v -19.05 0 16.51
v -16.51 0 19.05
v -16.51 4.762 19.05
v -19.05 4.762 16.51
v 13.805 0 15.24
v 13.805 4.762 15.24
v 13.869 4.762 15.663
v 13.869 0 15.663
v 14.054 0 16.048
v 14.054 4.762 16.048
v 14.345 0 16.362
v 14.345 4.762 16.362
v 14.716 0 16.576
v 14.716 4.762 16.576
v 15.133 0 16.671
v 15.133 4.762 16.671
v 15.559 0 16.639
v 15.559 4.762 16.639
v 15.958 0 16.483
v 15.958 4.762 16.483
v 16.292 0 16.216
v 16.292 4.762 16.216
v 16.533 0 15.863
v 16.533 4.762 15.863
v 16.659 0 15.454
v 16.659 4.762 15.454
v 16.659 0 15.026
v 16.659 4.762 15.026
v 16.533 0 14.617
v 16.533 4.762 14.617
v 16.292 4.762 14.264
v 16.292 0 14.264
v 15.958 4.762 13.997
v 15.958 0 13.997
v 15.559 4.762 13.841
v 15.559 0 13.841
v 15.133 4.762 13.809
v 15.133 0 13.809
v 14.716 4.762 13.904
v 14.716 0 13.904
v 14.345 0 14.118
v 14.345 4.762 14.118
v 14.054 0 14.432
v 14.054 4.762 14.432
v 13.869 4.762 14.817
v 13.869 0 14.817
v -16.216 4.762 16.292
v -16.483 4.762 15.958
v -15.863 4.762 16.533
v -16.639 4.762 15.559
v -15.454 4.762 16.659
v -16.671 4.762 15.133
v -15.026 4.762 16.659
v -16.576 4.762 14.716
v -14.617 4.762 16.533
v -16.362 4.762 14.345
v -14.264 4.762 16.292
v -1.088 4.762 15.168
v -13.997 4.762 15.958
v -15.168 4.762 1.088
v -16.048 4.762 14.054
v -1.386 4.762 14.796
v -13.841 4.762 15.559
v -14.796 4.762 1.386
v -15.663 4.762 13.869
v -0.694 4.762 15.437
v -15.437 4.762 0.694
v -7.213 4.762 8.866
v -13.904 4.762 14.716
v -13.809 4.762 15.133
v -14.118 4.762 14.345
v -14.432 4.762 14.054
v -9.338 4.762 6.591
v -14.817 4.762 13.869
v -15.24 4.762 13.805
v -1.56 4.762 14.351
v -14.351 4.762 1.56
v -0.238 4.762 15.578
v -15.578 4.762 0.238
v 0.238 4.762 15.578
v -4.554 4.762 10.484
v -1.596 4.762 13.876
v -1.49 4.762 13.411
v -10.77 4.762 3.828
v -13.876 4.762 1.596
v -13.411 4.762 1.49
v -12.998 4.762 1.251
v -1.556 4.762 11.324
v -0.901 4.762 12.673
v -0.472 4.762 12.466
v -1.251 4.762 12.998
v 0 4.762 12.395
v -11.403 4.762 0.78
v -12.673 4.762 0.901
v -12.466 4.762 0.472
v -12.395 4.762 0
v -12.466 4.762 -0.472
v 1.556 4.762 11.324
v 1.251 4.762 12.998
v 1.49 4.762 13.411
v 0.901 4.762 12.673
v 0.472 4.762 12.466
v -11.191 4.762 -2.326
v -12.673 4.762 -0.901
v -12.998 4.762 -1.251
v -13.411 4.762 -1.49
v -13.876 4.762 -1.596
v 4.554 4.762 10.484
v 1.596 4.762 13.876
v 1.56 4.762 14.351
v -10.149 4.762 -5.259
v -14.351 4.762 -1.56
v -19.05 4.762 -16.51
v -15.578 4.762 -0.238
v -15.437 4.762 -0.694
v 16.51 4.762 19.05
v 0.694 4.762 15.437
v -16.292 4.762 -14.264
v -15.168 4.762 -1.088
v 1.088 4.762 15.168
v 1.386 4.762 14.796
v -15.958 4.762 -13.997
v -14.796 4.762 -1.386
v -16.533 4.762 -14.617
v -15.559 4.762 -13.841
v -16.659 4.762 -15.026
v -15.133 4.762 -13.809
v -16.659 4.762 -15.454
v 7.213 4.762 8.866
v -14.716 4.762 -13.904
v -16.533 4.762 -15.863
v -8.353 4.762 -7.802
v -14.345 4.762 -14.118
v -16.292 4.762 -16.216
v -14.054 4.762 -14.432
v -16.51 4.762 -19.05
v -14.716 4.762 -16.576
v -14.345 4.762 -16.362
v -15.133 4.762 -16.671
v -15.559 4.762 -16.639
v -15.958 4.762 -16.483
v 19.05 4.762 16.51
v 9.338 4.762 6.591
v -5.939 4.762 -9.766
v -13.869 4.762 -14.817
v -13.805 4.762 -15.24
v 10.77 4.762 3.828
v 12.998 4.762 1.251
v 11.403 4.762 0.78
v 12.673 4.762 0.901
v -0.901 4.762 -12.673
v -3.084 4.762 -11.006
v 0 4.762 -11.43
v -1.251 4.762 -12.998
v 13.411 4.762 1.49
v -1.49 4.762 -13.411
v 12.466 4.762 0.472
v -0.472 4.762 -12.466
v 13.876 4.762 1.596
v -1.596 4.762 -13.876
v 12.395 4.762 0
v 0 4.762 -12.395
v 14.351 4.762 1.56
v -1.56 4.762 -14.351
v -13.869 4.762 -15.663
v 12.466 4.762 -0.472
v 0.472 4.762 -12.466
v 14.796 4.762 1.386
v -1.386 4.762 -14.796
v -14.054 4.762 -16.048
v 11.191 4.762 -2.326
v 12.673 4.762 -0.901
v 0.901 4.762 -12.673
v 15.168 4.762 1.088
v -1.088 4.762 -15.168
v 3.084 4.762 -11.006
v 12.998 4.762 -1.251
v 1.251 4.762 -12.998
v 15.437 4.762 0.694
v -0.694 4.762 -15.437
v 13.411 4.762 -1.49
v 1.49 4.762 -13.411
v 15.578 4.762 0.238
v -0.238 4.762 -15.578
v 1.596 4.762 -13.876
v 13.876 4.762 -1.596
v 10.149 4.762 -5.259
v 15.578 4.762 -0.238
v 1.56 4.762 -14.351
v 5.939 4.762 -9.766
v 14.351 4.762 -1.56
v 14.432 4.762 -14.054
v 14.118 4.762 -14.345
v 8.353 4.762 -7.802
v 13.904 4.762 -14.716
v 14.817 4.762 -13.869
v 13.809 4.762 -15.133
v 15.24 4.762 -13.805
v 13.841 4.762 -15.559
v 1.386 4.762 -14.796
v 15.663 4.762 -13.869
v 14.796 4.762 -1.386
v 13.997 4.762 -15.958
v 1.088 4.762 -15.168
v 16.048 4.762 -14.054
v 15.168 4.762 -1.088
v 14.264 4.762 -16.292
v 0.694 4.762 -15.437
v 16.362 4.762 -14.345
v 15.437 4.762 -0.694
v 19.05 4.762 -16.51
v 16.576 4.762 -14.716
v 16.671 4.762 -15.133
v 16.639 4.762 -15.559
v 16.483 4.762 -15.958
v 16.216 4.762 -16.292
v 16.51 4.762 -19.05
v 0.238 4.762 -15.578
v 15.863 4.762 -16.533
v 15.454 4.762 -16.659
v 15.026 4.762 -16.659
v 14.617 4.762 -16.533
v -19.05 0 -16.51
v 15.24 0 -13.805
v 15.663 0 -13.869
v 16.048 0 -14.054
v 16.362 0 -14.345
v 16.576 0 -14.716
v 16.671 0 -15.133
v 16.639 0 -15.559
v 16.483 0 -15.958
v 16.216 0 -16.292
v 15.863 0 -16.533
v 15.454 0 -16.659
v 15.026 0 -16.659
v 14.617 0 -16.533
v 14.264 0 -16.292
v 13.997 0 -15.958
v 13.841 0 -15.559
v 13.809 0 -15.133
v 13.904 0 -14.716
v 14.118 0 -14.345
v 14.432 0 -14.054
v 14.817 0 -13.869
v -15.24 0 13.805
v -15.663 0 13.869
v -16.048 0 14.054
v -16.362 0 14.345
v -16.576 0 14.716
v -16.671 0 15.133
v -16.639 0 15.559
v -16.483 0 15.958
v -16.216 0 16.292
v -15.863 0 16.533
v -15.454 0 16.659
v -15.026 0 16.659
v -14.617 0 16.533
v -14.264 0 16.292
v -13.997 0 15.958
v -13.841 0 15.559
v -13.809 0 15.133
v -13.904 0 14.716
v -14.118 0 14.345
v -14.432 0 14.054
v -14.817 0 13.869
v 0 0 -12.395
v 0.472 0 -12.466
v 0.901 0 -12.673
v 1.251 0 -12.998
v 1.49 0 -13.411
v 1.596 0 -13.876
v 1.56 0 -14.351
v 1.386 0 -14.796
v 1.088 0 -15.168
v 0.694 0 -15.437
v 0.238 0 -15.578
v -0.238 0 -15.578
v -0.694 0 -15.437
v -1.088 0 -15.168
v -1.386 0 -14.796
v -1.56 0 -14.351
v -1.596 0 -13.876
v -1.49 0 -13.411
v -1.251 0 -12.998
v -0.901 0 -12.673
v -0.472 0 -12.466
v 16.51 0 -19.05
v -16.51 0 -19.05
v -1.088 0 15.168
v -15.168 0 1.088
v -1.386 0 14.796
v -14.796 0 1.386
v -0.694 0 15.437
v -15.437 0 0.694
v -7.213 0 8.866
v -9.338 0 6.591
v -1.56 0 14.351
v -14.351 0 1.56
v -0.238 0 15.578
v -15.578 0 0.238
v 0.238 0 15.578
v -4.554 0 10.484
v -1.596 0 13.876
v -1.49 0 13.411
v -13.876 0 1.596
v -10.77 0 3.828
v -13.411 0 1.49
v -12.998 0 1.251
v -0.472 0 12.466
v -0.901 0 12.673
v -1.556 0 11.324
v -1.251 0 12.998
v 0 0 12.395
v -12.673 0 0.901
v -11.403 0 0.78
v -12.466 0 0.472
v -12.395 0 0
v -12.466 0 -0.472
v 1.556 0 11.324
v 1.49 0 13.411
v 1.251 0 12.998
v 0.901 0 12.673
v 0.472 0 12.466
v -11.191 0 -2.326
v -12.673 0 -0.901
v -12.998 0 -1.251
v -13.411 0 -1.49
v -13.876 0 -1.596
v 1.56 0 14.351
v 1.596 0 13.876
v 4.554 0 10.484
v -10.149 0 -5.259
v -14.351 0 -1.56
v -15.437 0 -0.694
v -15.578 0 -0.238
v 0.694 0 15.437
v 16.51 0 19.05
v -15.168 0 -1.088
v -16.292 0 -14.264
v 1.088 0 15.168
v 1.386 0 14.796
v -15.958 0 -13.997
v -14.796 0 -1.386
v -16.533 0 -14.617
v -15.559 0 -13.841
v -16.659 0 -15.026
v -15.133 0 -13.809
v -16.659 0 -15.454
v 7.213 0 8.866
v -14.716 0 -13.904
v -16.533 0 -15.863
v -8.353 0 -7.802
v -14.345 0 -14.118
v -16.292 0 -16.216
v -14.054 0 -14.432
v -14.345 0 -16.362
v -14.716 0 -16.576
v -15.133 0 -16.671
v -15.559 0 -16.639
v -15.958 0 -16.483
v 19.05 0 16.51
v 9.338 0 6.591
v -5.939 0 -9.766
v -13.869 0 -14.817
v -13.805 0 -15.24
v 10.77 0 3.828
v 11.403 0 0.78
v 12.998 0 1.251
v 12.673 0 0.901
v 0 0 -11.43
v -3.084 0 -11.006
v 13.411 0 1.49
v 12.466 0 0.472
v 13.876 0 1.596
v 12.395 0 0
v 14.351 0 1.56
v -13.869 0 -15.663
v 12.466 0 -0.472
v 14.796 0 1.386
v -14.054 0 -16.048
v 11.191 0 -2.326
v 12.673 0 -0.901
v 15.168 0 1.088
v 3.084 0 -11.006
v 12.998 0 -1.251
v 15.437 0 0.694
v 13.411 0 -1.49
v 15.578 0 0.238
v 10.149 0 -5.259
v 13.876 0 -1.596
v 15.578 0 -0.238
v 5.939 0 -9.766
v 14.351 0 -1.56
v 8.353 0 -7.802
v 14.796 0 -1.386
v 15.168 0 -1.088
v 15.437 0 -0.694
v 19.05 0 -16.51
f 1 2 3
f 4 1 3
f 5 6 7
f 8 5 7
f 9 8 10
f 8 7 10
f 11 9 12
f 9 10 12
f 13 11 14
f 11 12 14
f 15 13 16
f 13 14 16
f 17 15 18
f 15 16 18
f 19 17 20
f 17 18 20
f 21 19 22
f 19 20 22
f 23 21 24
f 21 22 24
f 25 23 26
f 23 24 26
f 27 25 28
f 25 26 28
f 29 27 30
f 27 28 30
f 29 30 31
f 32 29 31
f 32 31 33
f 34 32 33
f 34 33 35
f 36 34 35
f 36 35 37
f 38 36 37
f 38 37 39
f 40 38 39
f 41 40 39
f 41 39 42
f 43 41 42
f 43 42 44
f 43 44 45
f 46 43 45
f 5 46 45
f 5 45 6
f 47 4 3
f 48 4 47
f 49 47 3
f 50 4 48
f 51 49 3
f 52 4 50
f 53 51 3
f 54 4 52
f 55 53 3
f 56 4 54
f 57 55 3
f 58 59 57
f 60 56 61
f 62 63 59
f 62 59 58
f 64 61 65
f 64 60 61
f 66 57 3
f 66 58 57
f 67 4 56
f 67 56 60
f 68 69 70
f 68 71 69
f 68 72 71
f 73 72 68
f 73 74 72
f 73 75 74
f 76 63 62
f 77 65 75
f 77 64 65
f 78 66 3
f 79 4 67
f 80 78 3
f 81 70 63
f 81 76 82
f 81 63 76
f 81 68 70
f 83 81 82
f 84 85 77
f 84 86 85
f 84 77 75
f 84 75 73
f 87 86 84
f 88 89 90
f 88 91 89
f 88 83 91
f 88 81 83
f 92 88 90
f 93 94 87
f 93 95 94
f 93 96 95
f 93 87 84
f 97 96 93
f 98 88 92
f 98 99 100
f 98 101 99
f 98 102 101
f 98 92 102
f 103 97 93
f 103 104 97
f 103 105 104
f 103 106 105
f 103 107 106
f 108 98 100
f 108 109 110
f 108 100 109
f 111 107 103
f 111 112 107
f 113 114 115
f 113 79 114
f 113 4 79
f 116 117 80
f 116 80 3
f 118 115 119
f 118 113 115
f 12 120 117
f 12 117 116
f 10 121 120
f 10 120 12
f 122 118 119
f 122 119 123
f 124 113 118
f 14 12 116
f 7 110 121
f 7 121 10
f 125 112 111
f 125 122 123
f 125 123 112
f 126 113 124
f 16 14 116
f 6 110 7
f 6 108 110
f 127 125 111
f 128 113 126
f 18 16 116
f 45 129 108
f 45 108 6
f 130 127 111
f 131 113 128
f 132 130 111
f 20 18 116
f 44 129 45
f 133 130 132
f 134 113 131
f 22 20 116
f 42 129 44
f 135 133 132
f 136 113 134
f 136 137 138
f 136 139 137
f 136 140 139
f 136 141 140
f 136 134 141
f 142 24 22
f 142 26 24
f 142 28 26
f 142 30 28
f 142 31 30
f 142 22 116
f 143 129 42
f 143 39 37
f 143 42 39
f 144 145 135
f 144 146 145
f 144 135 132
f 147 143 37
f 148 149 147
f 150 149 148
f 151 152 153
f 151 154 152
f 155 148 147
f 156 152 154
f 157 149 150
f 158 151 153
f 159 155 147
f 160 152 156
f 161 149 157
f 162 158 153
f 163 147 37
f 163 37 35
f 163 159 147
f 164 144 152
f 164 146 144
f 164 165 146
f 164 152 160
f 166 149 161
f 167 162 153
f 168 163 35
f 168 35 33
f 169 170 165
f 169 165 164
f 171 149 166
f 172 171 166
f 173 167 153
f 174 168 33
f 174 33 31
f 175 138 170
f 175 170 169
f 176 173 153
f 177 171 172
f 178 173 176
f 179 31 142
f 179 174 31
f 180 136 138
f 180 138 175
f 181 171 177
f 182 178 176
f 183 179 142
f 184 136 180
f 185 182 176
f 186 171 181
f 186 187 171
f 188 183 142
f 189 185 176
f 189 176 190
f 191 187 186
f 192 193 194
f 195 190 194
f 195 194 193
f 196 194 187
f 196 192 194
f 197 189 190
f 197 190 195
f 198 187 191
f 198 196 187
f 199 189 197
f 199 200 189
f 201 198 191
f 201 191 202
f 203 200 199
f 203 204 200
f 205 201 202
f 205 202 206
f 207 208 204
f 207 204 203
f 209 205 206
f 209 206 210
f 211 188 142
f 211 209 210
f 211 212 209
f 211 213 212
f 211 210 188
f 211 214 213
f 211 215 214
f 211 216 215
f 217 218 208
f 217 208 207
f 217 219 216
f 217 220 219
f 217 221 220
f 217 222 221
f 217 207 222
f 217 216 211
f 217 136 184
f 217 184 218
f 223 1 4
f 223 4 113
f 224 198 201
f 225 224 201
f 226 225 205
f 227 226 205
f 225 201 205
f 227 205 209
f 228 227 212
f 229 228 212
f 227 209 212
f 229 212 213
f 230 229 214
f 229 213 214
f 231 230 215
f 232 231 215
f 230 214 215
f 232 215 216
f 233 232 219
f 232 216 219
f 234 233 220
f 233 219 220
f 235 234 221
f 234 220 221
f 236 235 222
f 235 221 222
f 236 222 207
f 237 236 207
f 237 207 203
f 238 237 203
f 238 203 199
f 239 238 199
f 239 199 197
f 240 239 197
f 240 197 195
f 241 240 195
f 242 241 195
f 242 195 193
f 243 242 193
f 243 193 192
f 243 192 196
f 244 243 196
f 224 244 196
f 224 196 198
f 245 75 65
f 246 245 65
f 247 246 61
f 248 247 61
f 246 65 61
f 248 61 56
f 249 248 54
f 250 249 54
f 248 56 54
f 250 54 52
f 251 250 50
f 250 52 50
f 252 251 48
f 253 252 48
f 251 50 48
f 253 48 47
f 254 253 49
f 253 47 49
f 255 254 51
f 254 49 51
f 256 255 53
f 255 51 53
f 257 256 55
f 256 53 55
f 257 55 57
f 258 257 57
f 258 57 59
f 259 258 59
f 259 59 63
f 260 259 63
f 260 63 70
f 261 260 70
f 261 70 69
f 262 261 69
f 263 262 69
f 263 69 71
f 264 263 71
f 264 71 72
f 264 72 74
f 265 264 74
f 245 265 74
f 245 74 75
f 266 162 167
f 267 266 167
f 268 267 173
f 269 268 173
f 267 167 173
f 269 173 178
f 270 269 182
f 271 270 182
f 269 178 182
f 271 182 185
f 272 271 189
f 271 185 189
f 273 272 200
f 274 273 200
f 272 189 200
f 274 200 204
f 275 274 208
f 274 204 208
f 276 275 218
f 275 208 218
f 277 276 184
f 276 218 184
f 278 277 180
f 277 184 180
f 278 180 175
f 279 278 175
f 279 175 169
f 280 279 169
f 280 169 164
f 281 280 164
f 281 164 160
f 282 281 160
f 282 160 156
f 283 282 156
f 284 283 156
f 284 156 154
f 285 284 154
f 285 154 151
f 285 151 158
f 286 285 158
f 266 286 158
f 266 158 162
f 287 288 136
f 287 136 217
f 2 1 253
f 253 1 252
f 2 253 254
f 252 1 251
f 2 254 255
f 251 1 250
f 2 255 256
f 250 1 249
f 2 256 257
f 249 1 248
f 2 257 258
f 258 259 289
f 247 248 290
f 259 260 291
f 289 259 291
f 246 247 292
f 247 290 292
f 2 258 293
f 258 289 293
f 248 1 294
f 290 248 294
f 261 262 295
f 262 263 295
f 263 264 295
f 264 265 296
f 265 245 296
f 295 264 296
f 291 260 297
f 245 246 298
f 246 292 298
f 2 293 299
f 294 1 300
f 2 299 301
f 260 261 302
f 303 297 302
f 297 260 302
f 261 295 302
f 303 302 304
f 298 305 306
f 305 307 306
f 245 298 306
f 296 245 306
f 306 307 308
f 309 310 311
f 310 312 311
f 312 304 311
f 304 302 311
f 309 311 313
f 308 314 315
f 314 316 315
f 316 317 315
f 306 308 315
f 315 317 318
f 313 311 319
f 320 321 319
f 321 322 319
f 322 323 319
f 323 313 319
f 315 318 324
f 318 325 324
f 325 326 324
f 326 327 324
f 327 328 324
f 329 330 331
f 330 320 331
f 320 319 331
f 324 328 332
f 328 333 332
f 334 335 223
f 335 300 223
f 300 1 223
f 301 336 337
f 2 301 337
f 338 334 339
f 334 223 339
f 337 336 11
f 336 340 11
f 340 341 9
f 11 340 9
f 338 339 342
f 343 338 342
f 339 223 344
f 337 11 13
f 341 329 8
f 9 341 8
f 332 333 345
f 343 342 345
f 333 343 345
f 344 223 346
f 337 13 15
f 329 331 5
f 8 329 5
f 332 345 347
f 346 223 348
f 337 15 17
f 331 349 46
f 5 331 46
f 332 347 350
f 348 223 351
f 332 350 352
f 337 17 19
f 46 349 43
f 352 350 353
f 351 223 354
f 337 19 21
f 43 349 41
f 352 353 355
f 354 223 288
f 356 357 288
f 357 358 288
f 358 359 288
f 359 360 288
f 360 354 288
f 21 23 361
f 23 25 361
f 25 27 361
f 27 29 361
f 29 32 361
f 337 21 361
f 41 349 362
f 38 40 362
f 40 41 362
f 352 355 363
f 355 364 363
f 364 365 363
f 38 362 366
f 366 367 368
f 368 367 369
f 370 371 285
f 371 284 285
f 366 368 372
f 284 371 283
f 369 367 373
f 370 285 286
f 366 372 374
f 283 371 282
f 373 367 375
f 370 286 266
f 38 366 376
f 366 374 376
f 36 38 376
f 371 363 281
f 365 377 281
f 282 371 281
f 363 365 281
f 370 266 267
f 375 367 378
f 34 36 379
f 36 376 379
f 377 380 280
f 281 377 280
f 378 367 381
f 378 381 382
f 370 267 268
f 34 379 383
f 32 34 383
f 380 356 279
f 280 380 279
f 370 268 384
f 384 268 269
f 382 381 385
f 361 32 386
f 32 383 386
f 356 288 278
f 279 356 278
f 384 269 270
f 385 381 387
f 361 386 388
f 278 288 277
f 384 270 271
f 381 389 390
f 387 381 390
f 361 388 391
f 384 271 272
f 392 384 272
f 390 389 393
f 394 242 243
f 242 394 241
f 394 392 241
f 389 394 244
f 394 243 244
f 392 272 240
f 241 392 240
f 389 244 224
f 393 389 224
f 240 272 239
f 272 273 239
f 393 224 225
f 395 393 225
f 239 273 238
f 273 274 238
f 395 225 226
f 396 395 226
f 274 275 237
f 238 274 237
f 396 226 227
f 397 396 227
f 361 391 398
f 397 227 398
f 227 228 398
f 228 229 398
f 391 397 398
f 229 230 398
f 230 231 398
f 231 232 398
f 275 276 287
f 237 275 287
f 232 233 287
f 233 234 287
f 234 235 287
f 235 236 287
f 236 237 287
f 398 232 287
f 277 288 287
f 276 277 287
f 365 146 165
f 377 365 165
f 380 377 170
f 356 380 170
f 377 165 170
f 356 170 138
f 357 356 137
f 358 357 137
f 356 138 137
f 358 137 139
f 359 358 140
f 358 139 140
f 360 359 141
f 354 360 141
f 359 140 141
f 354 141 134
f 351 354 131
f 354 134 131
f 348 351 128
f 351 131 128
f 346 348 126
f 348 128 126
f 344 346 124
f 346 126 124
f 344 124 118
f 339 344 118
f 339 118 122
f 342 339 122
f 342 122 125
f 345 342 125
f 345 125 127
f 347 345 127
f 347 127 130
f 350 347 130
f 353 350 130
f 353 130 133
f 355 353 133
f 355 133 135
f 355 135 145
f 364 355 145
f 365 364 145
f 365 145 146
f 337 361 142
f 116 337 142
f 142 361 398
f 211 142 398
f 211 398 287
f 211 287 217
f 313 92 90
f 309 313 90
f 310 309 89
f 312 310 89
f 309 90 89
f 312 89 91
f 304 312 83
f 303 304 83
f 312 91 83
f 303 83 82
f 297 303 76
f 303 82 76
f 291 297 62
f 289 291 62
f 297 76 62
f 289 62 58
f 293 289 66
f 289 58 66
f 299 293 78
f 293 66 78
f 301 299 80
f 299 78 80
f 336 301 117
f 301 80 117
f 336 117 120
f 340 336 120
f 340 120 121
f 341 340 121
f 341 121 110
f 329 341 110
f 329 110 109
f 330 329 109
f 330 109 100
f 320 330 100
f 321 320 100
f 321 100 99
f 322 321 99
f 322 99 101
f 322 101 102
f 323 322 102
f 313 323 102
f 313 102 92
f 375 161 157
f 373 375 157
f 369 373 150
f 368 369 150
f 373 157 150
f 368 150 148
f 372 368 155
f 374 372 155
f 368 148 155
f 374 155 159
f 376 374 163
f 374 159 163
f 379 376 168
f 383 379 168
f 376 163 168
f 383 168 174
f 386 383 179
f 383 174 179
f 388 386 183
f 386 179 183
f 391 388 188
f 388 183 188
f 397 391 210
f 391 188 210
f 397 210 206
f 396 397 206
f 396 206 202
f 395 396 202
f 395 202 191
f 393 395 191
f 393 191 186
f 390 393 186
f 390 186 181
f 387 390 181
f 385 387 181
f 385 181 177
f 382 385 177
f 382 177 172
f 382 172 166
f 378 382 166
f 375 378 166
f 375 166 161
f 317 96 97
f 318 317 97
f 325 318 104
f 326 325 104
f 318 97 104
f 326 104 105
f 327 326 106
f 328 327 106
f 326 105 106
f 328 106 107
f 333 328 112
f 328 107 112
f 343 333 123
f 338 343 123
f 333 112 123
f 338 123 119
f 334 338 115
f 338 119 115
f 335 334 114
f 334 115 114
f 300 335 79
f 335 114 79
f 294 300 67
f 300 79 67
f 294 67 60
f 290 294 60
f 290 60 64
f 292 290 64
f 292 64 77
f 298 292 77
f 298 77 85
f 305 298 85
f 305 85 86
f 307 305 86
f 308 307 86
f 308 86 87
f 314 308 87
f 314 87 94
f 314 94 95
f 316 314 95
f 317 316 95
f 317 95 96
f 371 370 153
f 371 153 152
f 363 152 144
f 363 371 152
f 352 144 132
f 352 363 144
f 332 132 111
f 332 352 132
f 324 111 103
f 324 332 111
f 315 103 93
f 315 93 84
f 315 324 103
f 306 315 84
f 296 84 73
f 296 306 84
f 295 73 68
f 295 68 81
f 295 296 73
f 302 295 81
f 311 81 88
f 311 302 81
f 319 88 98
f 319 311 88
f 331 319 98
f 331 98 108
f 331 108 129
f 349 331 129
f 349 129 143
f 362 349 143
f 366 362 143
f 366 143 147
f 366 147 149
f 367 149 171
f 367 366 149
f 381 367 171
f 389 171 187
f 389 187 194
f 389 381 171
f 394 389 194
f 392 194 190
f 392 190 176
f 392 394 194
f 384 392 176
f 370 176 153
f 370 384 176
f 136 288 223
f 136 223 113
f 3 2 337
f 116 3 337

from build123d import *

# Parameters (mm, degrees)
SKETCH1_W           = 38.1
SKETCH1_H           = 38.1
SKETCH1_R           = 11.43
BOSS_EXTRUDE1_DEPTH = 4.7625
SKETCH2_R           = 1.6002
SKETCH2_R_2         = 1.4351
CUT_EXTRUDE1_DEPTH  = 28.358479604
CIRPATTERN1_COUNT   = 4
CHAMFER1_SIZE       = 2.54


with BuildPart() as part:
    # Sketch1 → Boss-Extrude1 (new body)
    with BuildSketch(Plane(origin=(0, 0, 0), x_dir=(1, 0, 0), z_dir=(0, 1, 0))):
        Rectangle(SKETCH1_W, SKETCH1_H)
        with Locations(Location((0, 0, 0), (0, 0, 90))):
            Circle(SKETCH1_R, mode=Mode.SUBTRACT)
    extrude(amount=BOSS_EXTRUDE1_DEPTH)

    # Sketch2 → Cut-Extrude1 (cut, through all)
    with BuildSketch(Plane(origin=(0, 4.7625, 0), x_dir=(1, 0, 0), z_dir=(0, 1, 0))):
        with Locations(Location((0, 13.9954, 0), (0, 0, 270))):
            Circle(SKETCH2_R)
        with Locations(Location((15.24, 15.24, 0), (0, 0, 270))):
            Circle(SKETCH2_R_2)
    cut_extrude1 = extrude(amount=-CUT_EXTRUDE1_DEPTH, mode=Mode.SUBTRACT)

    # CirPattern1: Cut-Extrude1 ×4 about axis
    cirpattern1_axis = Axis((0, 0, 0), (0, 1, 0))
    for i in range(1, CIRPATTERN1_COUNT):
        add(cut_extrude1.rotate(cirpattern1_axis, i * 360 / CIRPATTERN1_COUNT), mode=Mode.SUBTRACT)

    # Chamfer1
    chamfer1_edges = [part.edges().sort_by_distance(p)[0] for p in [
        (19.05, 2.38125, 19.05),
        (-19.05, 2.38125, 19.05),
        (-19.05, 2.38125, -19.05),
        (19.05, 2.38125, -19.05),
    ]]
    chamfer(chamfer1_edges, length=CHAMFER1_SIZE)


solid = part.part
